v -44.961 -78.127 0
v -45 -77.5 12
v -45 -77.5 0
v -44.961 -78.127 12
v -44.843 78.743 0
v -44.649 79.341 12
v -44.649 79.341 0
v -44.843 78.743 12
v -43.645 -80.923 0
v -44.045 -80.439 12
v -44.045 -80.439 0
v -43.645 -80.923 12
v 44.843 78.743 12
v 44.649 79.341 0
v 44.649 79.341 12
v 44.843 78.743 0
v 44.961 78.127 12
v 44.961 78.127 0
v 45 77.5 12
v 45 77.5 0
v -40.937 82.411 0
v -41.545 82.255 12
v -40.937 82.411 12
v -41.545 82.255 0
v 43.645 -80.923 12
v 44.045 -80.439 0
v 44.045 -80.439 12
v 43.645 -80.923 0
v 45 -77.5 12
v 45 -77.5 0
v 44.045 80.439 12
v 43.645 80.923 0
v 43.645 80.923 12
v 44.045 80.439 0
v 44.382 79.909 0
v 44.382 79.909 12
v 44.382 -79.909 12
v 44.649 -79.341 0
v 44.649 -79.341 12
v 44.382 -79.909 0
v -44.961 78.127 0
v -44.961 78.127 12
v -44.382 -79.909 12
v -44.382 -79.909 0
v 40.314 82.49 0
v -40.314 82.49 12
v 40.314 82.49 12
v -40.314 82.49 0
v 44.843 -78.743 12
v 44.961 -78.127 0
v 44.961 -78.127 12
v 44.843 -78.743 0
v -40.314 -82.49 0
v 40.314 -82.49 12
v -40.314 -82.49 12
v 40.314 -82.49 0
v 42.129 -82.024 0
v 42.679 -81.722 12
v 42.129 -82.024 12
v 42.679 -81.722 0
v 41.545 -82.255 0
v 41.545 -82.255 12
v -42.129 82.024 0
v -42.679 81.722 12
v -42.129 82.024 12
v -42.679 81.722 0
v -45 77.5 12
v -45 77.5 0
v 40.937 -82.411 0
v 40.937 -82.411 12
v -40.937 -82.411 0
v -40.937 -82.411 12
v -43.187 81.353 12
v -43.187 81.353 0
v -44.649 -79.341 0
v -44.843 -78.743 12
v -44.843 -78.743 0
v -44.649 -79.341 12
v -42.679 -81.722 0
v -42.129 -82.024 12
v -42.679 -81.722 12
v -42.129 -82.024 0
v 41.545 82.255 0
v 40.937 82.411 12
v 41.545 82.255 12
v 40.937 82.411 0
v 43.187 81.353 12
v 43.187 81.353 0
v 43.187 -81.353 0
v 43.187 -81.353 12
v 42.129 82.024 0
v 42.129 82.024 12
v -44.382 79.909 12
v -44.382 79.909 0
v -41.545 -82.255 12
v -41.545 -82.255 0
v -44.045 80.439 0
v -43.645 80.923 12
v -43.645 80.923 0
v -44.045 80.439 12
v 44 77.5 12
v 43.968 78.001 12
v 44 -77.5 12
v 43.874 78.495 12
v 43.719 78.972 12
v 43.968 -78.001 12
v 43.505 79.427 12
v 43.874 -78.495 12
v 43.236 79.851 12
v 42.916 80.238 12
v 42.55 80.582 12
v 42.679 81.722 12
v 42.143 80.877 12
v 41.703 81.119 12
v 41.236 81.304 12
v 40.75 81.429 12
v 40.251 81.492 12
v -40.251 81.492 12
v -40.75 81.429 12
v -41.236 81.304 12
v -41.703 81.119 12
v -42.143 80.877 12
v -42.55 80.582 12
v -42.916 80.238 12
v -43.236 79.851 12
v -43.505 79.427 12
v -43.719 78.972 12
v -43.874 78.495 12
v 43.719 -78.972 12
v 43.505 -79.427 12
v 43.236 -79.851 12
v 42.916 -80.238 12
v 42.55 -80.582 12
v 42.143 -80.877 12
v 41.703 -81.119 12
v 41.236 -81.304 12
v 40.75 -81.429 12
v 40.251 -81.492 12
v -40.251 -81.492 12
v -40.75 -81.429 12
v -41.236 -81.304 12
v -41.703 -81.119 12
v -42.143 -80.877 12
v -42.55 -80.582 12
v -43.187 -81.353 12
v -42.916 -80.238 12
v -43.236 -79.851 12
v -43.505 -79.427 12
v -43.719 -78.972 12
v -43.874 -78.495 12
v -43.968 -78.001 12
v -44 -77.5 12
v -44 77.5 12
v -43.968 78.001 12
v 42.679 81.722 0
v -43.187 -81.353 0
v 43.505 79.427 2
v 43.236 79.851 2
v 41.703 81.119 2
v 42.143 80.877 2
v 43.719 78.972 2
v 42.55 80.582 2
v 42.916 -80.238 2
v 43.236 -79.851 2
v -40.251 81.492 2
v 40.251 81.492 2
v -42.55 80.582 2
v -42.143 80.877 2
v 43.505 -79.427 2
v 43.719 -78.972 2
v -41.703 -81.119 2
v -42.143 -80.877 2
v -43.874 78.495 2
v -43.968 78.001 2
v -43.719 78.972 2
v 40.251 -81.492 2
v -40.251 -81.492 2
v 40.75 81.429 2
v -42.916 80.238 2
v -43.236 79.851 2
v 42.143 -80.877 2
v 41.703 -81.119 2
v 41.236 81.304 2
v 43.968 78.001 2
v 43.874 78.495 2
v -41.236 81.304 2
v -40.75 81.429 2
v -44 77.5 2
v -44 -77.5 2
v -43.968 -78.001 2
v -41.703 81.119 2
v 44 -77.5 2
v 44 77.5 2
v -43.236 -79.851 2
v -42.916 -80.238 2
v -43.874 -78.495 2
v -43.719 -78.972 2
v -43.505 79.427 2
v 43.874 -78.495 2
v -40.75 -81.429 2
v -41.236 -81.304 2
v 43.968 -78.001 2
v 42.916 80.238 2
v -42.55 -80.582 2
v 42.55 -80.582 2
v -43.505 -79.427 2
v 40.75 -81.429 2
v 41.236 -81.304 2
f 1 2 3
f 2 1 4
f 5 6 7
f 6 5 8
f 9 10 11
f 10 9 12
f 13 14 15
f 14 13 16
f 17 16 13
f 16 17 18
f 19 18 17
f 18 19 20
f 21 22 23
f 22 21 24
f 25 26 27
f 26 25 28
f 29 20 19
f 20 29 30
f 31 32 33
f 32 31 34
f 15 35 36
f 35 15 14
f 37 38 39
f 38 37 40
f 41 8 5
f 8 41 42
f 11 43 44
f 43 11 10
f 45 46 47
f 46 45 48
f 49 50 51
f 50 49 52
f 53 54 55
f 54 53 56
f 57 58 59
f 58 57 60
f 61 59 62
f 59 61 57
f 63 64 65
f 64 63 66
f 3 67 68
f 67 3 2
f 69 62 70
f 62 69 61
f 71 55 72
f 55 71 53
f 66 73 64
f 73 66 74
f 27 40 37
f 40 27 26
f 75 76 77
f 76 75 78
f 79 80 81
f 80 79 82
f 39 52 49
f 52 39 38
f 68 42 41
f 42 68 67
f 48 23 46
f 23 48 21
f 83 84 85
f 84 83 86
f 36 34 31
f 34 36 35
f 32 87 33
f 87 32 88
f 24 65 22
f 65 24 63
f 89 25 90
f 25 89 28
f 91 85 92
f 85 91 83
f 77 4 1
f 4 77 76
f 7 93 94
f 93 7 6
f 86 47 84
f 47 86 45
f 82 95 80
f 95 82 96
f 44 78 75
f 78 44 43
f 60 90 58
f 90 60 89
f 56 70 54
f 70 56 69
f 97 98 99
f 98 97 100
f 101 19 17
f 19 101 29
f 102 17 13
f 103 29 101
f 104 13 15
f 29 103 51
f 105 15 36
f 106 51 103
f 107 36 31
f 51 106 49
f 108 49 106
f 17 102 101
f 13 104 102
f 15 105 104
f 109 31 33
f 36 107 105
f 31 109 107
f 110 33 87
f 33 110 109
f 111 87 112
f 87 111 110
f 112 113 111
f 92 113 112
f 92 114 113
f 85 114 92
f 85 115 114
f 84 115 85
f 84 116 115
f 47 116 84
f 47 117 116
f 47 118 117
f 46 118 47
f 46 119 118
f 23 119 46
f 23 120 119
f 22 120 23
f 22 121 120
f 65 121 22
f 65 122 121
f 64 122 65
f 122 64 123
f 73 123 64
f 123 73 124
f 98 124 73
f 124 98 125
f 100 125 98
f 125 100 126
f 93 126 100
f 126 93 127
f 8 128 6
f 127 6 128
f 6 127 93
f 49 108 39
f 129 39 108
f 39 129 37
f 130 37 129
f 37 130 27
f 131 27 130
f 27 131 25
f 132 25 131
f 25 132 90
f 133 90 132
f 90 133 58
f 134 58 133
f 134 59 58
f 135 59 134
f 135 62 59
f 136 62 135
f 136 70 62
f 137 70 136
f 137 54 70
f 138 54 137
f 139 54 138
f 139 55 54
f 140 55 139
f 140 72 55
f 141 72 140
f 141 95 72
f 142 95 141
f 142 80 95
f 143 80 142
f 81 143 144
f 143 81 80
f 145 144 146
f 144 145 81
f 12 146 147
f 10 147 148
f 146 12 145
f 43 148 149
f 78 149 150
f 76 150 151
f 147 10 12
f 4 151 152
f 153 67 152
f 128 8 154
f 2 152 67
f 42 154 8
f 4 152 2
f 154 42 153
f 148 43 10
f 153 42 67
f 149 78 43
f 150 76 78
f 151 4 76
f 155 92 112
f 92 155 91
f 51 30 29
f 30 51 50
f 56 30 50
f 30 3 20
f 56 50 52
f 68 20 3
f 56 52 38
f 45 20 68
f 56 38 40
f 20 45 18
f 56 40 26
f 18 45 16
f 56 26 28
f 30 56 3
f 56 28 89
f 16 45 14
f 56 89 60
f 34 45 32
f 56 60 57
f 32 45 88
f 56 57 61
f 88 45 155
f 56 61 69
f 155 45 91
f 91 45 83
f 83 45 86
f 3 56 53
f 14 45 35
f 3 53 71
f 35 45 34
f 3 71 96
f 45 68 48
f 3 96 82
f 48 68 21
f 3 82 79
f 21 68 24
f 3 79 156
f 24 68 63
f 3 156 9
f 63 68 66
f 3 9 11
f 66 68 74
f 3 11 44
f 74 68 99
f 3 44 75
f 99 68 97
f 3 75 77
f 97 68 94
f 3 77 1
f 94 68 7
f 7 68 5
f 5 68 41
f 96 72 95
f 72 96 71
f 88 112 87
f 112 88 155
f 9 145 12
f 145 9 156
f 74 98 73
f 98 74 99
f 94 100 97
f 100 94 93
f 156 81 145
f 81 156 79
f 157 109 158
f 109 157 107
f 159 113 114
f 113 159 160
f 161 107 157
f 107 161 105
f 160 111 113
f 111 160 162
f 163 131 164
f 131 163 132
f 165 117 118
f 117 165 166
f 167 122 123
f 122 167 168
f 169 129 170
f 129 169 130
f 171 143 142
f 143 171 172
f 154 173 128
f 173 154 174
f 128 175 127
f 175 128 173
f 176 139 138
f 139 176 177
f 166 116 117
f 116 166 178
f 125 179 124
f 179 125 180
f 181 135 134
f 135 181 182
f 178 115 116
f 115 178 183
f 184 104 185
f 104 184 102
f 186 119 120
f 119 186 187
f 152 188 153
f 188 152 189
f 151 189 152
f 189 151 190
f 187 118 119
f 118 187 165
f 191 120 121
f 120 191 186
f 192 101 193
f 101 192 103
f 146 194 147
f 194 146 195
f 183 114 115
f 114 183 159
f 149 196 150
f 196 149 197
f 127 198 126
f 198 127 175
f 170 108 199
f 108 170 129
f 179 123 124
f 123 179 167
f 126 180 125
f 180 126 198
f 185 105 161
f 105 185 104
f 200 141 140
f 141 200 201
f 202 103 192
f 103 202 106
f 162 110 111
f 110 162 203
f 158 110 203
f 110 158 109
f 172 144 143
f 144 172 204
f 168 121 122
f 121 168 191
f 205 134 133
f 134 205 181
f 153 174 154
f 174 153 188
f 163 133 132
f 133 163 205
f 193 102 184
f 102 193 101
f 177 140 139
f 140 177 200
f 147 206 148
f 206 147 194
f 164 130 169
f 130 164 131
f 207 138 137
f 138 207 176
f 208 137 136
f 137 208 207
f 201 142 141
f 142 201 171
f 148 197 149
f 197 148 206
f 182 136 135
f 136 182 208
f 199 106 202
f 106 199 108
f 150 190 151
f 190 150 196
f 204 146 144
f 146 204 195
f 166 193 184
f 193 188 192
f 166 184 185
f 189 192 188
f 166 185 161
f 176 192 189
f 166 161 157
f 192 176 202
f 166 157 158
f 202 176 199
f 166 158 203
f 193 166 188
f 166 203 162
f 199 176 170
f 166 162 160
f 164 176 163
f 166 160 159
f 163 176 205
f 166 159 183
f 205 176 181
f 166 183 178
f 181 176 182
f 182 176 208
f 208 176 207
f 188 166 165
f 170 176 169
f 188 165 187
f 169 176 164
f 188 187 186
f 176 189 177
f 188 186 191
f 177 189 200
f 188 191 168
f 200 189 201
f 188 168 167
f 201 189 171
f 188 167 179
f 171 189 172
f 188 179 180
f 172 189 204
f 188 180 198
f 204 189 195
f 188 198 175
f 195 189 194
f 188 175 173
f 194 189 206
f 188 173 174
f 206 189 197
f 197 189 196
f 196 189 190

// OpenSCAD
$fn = 50;


difference() {
	union() {
		hull() {
			translate(v = [-40.0000000000, 77.5000000000, 0]) {
				cylinder(h = 12, r = 5);
			}
			translate(v = [40.0000000000, 77.5000000000, 0]) {
				cylinder(h = 12, r = 5);
			}
			translate(v = [-40.0000000000, -77.5000000000, 0]) {
				cylinder(h = 12, r = 5);
			}
			translate(v = [40.0000000000, -77.5000000000, 0]) {
				cylinder(h = 12, r = 5);
			}
		}
	}
	union() {
		translate(v = [0, 0, 2]) {
			hull() {
				translate(v = [-40.0000000000, 77.5000000000, 0]) {
					cylinder(h = 10, r = 4);
				}
				translate(v = [40.0000000000, 77.5000000000, 0]) {
					cylinder(h = 10, r = 4);
				}
				translate(v = [-40.0000000000, -77.5000000000, 0]) {
					cylinder(h = 10, r = 4);
				}
				translate(v = [40.0000000000, -77.5000000000, 0]) {
					cylinder(h = 10, r = 4);
				}
			}
		}
	}
}
